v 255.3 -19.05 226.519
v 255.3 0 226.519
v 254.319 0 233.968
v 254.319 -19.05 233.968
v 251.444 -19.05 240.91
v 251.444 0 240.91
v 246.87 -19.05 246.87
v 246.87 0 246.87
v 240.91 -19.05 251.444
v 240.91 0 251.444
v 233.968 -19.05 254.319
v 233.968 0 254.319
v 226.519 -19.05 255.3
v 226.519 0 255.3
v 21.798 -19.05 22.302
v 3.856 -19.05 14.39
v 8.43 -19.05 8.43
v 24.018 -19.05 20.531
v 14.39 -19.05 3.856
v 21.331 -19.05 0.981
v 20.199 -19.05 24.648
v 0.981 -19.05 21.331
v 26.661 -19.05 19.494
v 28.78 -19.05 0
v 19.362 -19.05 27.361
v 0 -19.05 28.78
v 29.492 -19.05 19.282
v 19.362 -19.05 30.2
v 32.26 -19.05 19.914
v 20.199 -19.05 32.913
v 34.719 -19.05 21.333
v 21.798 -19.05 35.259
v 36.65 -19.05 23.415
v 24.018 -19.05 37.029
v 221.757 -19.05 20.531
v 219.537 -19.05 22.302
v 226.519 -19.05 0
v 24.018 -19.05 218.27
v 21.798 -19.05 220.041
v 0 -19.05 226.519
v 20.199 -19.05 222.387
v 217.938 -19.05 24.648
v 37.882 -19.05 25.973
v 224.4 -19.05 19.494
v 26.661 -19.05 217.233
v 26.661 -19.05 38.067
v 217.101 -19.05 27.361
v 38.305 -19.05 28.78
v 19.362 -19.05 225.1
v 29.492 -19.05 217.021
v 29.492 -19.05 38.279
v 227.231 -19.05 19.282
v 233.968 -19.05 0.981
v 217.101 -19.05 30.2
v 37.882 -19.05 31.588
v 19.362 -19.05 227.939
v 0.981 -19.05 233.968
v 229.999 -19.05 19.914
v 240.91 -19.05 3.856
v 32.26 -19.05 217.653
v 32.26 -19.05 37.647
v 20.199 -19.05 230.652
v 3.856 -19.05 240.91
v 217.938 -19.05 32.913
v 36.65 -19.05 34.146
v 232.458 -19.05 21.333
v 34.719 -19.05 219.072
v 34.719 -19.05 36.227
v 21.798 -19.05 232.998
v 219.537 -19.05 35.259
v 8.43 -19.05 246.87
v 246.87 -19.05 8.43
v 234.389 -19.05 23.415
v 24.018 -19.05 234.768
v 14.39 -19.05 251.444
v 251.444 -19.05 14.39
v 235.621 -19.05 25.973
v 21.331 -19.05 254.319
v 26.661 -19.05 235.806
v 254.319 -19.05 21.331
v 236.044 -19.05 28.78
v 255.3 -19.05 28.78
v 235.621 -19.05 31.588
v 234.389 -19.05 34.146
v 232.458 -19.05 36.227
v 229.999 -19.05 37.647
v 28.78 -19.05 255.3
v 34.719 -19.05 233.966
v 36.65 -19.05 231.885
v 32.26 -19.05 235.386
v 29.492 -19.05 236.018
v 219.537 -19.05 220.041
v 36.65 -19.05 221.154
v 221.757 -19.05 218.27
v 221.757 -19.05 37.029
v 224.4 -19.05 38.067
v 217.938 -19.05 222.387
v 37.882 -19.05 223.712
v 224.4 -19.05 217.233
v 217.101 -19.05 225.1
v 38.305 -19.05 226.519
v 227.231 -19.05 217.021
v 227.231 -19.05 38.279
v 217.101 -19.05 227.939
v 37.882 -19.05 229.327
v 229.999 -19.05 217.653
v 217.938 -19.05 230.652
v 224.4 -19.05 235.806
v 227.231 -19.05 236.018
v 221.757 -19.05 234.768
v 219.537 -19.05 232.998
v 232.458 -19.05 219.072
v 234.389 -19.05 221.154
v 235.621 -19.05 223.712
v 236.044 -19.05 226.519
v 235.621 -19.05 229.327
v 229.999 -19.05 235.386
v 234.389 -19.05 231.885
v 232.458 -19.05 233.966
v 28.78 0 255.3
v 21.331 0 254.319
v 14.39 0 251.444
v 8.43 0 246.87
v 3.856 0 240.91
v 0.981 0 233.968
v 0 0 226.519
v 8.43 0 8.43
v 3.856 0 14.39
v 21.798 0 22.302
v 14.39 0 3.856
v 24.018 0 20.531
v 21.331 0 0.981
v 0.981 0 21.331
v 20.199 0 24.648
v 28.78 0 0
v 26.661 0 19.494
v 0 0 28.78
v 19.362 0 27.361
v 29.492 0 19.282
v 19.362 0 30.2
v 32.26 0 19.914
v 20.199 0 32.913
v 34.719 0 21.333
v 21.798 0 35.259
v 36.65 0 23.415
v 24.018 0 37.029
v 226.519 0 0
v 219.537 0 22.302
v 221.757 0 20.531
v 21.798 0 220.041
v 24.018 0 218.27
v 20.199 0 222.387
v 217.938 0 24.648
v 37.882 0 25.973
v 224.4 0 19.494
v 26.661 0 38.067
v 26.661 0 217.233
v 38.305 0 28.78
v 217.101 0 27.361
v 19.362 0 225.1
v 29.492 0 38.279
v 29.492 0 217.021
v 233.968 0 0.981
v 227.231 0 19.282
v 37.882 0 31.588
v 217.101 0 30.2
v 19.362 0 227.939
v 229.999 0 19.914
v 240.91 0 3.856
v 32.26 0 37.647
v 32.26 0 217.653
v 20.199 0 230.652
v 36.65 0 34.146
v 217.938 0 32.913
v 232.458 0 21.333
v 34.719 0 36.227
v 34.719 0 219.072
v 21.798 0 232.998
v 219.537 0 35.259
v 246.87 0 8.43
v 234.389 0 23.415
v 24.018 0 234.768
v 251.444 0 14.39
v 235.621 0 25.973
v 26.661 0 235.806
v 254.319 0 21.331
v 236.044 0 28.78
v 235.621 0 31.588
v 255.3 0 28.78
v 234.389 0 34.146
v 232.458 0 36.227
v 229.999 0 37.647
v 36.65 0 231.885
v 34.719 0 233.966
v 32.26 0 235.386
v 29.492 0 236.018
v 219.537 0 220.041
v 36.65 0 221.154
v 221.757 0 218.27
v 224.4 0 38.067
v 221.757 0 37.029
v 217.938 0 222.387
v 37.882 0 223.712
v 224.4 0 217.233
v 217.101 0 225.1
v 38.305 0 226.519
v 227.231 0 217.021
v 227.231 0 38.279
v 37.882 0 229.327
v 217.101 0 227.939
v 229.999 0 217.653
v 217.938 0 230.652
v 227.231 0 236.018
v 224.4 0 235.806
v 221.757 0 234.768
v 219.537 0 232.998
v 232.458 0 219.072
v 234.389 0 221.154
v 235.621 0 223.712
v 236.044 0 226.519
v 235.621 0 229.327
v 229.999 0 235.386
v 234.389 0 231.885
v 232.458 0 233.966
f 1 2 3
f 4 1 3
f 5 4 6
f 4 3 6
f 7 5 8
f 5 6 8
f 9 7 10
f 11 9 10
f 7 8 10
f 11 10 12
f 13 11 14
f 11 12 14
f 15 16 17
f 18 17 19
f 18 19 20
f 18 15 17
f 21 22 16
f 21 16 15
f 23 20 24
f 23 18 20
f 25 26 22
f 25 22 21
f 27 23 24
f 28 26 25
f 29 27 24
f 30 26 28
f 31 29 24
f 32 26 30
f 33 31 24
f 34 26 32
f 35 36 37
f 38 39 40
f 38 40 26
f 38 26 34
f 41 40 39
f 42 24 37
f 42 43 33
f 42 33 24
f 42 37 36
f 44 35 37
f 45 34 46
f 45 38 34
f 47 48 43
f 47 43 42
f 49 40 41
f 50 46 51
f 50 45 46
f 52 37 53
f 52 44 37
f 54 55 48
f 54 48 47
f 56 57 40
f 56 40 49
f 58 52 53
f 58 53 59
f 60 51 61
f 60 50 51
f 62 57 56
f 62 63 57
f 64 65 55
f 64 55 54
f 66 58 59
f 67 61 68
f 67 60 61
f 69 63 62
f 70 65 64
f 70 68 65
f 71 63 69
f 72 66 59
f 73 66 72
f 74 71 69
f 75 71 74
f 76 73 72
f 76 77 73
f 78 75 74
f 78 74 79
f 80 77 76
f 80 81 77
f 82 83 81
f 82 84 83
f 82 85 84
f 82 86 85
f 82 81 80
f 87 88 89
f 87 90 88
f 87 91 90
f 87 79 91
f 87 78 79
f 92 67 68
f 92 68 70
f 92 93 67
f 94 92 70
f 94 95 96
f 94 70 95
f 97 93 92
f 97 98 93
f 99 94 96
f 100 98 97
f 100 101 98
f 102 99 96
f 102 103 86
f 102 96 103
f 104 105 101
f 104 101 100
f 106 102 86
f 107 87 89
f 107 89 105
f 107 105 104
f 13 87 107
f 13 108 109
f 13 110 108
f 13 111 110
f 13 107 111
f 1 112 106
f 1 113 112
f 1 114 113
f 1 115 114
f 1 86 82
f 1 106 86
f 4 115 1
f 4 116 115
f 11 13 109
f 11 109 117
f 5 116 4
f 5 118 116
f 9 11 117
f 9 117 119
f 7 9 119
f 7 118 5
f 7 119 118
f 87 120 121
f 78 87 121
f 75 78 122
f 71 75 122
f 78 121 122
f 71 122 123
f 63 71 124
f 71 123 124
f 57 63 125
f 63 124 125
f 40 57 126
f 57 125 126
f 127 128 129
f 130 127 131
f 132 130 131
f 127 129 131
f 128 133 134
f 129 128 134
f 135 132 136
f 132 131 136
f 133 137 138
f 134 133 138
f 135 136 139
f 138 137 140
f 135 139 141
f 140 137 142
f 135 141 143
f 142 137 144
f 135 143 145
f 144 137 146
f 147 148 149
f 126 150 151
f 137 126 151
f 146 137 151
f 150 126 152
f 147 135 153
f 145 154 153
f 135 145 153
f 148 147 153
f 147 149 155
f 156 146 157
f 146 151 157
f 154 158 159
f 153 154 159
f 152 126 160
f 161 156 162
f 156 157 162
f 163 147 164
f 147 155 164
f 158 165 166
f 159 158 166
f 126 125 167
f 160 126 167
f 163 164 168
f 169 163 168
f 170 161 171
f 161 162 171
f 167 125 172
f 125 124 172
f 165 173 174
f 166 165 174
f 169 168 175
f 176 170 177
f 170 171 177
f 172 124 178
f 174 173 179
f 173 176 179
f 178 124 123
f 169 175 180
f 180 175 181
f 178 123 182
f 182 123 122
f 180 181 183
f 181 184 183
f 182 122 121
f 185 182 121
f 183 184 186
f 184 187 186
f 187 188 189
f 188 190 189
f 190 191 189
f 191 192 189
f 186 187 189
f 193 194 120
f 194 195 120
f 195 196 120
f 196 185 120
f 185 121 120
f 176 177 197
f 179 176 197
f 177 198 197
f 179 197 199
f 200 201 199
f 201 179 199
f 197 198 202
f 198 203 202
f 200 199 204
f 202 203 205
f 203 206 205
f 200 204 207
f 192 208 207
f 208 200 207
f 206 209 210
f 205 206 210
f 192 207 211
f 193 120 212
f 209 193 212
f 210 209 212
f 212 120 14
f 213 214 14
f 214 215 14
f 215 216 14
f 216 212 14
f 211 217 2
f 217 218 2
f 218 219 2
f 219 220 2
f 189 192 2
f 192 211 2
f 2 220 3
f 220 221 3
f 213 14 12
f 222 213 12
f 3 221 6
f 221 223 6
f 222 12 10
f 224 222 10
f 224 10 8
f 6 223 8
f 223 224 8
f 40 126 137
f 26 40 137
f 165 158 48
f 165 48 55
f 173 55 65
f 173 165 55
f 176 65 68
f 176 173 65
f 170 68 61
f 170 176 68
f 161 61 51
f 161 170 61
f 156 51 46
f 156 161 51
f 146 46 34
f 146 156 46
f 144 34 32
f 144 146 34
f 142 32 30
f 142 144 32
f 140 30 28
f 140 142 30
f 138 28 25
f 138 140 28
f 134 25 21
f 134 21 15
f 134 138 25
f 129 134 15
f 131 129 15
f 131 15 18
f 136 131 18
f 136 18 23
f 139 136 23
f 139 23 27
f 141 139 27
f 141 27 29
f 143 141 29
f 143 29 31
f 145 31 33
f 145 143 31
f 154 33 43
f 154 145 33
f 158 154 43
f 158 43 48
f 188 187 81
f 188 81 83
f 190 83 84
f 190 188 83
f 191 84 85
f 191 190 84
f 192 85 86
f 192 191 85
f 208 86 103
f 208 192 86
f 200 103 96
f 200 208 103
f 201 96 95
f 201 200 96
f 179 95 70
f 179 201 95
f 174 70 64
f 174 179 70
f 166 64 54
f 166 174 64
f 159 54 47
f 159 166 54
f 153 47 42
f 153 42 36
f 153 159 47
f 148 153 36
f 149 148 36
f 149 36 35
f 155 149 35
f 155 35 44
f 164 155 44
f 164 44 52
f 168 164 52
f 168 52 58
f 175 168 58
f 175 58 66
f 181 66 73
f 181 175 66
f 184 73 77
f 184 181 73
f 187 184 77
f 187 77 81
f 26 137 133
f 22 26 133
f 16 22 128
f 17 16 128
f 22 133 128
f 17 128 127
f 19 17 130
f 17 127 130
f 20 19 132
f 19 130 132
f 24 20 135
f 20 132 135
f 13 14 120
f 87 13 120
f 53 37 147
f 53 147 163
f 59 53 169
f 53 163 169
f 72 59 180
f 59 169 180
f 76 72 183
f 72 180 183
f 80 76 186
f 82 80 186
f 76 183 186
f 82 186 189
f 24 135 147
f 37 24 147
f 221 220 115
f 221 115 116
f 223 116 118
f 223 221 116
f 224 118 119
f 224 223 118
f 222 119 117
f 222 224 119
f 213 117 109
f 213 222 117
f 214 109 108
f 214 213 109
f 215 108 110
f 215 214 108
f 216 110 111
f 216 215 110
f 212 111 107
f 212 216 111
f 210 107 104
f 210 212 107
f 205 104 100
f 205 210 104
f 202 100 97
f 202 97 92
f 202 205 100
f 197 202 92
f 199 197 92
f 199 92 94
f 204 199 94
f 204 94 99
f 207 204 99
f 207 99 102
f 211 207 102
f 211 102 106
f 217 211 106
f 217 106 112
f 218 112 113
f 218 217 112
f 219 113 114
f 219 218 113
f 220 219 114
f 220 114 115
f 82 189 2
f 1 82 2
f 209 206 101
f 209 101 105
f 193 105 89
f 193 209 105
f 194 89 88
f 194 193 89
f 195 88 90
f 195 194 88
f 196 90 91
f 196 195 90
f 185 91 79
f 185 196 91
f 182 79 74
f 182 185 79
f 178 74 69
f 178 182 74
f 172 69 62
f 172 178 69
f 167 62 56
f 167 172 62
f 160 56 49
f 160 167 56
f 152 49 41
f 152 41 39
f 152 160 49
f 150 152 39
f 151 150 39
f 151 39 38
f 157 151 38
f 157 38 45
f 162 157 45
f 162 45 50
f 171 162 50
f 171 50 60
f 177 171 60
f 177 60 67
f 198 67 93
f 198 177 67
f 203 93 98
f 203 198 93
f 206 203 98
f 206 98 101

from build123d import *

# Parameters (mm, degrees)
F0_R     = 9.525
F1_DEPTH = 19.05


# Not quite as in the source:
# - a feature names something its author has since deleted; it is built from what else it names


with BuildPart() as f1:
    # F0 (on Front) → F1 (new body)
    with BuildSketch(Plane.XZ):
        with BuildLine():
            ThreePointArc((0, 28.7803760395), (8.4295769769, 8.4295769769), (28.7803760395, 0))
            Line((28.7803760395, 0), (226.5193760395, 0))
            ThreePointArc((226.5193760395, 0), (246.8701751021, 8.4295769769), (255.299752079, 28.7803760395))
            Line((255.299752079, 28.7803760395), (255.299752079, 226.5193760395))
            ThreePointArc((255.299752079, 226.5193760395), (246.8701751021, 246.8701751021), (226.5193760395, 255.299752079))
            Line((226.5193760395, 255.299752079), (28.7803760395, 255.299752079))
            ThreePointArc((28.7803760395, 255.299752079), (8.4295769769, 246.8701751021), (0, 226.5193760395))
            Line((0, 226.5193760395), (0, 28.7803760395))
        make_face()
        with Locations((28.7803760395, 28.7803760395)):
            Circle(F0_R, mode=Mode.SUBTRACT)
        with Locations((226.5193760395, 28.7803760395)):
            Circle(F0_R, mode=Mode.SUBTRACT)
        with Locations((28.7803760395, 226.5193760395)):
            Circle(F0_R, mode=Mode.SUBTRACT)
        with Locations((226.5193760395, 226.5193760395)):
            Circle(F0_R, mode=Mode.SUBTRACT)
    extrude(amount=F1_DEPTH)


solid = f1.part
